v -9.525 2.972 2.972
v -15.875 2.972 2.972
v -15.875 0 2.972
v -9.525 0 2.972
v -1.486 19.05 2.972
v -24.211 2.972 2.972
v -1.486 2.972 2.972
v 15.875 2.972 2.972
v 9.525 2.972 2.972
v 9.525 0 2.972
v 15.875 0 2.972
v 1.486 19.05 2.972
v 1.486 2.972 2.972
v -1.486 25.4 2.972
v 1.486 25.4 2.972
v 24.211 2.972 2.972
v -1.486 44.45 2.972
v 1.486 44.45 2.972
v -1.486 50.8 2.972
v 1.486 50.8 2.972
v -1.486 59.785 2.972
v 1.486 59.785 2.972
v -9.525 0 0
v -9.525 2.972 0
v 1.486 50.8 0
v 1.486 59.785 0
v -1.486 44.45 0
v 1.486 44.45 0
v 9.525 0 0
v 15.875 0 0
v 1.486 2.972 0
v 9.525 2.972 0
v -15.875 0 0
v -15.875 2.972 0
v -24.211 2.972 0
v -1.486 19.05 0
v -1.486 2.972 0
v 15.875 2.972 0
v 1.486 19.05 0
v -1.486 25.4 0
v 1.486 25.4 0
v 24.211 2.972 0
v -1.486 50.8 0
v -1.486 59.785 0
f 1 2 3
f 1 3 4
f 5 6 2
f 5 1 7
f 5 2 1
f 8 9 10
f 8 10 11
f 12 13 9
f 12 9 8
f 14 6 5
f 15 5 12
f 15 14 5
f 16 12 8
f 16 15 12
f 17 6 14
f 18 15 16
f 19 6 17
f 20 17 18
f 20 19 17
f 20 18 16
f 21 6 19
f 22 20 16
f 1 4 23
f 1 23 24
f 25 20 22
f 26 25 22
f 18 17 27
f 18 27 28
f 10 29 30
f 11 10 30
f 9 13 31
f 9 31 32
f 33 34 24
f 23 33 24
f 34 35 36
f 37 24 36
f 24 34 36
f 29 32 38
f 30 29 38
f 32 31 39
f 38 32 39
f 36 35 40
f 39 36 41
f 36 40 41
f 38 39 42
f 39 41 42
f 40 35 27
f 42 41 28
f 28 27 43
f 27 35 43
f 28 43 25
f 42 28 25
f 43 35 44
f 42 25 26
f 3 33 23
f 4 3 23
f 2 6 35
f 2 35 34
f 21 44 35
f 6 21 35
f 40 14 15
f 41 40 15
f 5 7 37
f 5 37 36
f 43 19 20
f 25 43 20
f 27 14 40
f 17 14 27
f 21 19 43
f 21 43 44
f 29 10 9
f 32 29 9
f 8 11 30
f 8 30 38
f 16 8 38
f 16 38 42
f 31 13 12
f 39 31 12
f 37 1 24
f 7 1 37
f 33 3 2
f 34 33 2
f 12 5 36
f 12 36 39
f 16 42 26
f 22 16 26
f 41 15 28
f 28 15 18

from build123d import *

# Parameters (mm, degrees)
F1_DEPTH = 2.9718
F2_W     = 2.9718
F2_H     = 19.05
F2_H_2   = 25.4
F3_DEPTH = 25.4
F4_W     = 8.0391
F4_H     = 2.9718
F4_W_2   = 12.7
F5_DEPTH = 25.4


with BuildPart() as f1:
    # F0 (on Top) → F1 (new body)
    with BuildSketch(Plane.XY):
        Polygon((25.4, 0), (0, 63.5), (-25.4, 0), align=None)
    extrude(amount=F1_DEPTH)

    # F2 (on face) → F3 (cut)
    with BuildSketch(Plane.XY.offset(2.9718)):
        with Locations((0, 9.525)):
            Rectangle(F2_W, F2_H)
        with Locations((0, 34.925)):
            Rectangle(F2_W, F2_H)
        with Locations((0, 63.5)):
            Rectangle(F2_W, F2_H_2)
    extrude(amount=-F3_DEPTH, mode=Mode.SUBTRACT)

    # F4 (on face) → F5 (cut)
    with BuildSketch(Plane.XY.offset(2.9718)):
        with Locations((-5.50545, 1.4859)):
            Rectangle(F4_W, F4_H)
        with Locations((-22.225, 1.4859)):
            Rectangle(F4_W_2, F4_H)
        with Locations((5.50545, 1.4859)):
            Rectangle(F4_W, F4_H)
        with Locations((22.225, 1.4859)):
            Rectangle(F4_W_2, F4_H)
    extrude(amount=-F5_DEPTH, mode=Mode.SUBTRACT)


solid = f1.part
